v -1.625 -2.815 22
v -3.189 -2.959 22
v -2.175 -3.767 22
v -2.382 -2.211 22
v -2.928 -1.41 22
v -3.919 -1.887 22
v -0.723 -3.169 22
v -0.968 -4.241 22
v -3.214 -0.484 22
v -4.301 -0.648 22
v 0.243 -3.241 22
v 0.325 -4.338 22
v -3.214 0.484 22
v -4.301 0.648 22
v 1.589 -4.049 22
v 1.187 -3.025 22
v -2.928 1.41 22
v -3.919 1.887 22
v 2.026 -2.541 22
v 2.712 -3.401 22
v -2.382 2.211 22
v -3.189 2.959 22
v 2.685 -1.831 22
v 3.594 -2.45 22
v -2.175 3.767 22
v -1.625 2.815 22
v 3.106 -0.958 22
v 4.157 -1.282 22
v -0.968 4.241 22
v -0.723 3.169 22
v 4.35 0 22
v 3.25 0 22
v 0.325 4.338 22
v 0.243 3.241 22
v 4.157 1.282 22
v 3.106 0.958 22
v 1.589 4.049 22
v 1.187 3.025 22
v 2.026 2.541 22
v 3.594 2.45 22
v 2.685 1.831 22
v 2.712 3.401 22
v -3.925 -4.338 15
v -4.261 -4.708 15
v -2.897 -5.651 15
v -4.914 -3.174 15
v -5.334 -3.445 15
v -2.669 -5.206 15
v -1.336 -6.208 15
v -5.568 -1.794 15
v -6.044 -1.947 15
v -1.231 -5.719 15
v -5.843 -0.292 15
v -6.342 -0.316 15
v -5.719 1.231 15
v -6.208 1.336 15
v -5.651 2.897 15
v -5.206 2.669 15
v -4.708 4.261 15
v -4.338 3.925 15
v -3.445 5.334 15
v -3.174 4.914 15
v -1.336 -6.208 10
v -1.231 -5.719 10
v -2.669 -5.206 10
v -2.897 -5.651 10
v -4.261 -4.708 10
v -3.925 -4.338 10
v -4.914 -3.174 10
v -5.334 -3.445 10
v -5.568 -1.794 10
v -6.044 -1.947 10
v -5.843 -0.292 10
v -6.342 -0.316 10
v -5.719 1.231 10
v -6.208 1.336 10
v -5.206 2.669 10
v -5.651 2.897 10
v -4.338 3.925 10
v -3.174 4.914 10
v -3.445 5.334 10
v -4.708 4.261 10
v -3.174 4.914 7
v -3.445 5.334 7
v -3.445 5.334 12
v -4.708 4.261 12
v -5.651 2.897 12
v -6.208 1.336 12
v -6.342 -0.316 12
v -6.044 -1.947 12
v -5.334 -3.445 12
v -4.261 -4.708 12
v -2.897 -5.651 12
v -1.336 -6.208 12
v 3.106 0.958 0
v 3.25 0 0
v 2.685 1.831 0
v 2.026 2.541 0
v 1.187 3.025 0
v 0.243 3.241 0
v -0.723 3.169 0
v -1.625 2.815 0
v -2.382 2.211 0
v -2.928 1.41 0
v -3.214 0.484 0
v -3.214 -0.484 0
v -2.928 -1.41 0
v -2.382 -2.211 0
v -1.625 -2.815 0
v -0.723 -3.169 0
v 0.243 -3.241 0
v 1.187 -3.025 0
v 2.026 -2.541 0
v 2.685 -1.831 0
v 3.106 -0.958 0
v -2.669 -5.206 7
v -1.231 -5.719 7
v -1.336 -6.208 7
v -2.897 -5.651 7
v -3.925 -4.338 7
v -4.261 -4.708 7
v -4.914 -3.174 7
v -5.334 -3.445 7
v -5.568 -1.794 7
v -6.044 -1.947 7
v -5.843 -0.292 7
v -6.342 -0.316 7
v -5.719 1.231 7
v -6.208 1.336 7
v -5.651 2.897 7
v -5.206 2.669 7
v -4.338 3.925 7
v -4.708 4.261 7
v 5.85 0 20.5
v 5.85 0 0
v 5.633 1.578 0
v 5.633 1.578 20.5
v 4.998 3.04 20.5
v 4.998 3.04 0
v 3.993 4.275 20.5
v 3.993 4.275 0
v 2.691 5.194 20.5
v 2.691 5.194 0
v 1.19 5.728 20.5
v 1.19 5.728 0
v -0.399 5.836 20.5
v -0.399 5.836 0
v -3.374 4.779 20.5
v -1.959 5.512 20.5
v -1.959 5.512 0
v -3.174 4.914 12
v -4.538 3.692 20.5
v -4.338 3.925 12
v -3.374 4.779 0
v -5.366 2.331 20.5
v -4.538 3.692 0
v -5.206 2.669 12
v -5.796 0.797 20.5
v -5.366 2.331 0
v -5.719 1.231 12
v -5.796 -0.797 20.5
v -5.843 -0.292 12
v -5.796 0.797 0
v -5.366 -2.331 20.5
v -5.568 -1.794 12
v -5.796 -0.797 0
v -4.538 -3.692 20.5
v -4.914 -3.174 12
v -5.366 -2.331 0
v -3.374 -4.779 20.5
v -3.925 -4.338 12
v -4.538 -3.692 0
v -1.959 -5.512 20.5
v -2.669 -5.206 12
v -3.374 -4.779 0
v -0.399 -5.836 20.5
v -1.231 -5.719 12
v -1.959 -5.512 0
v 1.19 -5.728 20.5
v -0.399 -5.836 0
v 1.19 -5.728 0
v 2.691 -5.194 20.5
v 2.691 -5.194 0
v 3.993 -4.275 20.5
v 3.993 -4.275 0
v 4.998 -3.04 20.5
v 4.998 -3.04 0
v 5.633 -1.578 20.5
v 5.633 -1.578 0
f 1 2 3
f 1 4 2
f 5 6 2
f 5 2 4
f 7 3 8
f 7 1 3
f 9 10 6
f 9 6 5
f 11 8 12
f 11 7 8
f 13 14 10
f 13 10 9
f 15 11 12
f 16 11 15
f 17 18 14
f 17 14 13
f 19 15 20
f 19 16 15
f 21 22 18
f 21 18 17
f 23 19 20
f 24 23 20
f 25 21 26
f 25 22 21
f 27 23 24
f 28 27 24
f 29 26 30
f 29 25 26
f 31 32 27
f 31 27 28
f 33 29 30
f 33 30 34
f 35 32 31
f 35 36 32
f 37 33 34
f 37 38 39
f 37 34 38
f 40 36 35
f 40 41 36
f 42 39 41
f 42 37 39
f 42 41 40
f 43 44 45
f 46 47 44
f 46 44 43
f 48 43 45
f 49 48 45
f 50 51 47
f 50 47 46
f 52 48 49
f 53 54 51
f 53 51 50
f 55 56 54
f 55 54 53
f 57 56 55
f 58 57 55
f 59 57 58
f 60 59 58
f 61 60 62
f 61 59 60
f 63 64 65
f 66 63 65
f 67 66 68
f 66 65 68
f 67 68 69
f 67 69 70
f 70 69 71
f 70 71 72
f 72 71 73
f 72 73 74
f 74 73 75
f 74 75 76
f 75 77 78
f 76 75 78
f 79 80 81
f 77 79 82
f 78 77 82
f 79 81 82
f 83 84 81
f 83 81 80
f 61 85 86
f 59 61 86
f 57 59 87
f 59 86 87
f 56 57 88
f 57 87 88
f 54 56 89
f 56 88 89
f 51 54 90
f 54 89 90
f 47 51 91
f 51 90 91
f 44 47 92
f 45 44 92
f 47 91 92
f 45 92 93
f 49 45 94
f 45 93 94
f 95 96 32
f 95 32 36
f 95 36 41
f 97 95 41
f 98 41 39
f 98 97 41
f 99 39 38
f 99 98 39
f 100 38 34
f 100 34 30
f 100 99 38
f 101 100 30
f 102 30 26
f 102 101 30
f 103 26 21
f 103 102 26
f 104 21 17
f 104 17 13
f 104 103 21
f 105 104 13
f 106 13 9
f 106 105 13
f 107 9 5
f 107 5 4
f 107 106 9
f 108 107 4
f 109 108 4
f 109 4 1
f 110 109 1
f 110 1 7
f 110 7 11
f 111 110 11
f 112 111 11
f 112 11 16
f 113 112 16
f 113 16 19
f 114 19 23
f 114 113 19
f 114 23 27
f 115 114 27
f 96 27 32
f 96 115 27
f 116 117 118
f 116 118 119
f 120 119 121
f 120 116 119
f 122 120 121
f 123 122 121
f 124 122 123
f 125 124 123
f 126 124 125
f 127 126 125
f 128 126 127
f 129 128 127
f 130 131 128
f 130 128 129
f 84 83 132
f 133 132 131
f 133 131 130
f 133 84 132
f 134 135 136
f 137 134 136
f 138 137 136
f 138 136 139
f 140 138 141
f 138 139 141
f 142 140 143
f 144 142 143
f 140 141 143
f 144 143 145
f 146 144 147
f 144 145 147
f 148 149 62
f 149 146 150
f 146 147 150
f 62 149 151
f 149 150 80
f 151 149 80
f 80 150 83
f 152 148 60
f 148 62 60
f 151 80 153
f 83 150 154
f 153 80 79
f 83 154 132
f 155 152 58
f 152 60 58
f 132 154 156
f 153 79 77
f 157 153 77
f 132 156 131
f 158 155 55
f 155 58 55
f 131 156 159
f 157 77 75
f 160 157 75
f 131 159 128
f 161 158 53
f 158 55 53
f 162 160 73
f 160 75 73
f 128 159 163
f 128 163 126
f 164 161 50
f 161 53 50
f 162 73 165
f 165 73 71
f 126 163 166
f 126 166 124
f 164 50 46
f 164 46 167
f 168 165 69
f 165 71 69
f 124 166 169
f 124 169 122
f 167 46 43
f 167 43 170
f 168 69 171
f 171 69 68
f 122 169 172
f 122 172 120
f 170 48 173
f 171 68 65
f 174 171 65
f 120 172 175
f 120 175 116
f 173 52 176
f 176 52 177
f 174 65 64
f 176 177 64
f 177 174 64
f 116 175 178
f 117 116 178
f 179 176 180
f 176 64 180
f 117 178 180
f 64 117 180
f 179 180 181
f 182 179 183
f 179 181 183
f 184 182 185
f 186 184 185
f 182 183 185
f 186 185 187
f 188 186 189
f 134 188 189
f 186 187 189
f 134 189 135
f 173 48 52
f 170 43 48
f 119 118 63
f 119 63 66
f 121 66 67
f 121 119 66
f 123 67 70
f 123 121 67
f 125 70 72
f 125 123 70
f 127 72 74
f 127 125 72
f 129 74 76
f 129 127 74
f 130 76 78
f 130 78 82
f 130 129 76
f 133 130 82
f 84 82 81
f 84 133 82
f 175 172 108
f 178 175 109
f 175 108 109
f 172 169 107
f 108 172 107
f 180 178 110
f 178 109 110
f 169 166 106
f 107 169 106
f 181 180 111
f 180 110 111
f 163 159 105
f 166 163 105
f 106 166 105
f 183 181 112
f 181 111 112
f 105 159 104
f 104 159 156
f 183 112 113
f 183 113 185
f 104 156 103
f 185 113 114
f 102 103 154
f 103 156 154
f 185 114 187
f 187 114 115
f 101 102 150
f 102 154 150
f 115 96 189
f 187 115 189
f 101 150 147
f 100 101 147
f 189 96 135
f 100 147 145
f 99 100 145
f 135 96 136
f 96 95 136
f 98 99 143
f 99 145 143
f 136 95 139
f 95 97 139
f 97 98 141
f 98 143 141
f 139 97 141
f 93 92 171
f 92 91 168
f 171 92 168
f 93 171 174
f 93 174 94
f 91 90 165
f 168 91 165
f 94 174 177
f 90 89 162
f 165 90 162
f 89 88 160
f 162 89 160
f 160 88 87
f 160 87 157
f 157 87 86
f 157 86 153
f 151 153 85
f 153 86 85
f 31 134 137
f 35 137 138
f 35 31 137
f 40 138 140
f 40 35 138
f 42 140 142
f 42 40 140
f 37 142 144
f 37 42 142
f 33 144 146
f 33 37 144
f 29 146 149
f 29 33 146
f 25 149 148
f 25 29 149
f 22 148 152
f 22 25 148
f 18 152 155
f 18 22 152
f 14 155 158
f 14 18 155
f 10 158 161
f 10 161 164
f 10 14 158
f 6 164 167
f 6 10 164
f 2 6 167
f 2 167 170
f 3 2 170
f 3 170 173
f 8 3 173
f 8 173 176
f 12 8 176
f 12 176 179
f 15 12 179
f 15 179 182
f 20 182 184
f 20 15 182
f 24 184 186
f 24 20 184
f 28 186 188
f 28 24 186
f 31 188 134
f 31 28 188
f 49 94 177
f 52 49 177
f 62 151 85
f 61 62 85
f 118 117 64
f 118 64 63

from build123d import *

# Parameters (mm, degrees)
SKETCH_1_R      = 5.85
SKETCH_1_R_2    = 3.25
EXTRUDE_1_DEPTH = 22
CHAMFER_1_SIZE  = 1.5
EXTRUDE_START   = -10
EXTRUDE_2_DEPTH = 3
EXTRUDE_START_2 = 5
EXTRUDE_3_DEPTH = 3


with BuildPart() as part:
    # 草图1 → 凸台-拉伸1 (new body)
    with BuildSketch(Plane.XY):
        Circle(SKETCH_1_R)
        Circle(SKETCH_1_R_2, mode=Mode.SUBTRACT)
    extrude(amount=EXTRUDE_1_DEPTH)

    # 倒角1
    chamfer_1_edges = [part.edges().sort_by_distance(p)[0] for p in [
        (-5.85, 0, 22),
    ]]
    chamfer(chamfer_1_edges, length=CHAMFER_1_SIZE)

    # 草图2 → 凸台-拉伸2 (add)
    with BuildSketch(Plane.XY.offset(22).offset(EXTRUDE_START)):
        with BuildLine():
            Line((-3.173831975, 4.914192771), (-3.445099666, 5.334209247))
            ThreePointArc((-3.445099666, 5.334209247), (-6.246549311, -1.141543565), (-1.335802196, -6.207908866))
            Line((-1.335802196, -6.207908866), (-1.23062092, -5.719097145))
            ThreePointArc((-1.23062092, -5.719097145), (-5.754695034, -1.051658245), (-3.173831975, 4.914192771))
        make_face()
    extrude(amount=EXTRUDE_2_DEPTH)

    # 草图3 → 凸台-拉伸3 (add)
    with BuildSketch(Plane(origin=(0, 0, 12), x_dir=(-1, 0, 0), z_dir=(0, 0, -1)).offset(EXTRUDE_START_2)):
        with BuildLine():
            Line((1.23062092, -5.719097145), (1.335802196, -6.207908866))
            ThreePointArc((1.335802196, -6.207908866), (6.246549311, -1.141543565), (3.445099666, 5.334209247))
            Line((3.445099666, 5.334209247), (3.173831975, 4.914192771))
            ThreePointArc((3.173831975, 4.914192771), (5.754695034, -1.051658245), (1.23062092, -5.719097145))
        make_face()
    extrude(amount=-EXTRUDE_3_DEPTH)


solid = part.part
